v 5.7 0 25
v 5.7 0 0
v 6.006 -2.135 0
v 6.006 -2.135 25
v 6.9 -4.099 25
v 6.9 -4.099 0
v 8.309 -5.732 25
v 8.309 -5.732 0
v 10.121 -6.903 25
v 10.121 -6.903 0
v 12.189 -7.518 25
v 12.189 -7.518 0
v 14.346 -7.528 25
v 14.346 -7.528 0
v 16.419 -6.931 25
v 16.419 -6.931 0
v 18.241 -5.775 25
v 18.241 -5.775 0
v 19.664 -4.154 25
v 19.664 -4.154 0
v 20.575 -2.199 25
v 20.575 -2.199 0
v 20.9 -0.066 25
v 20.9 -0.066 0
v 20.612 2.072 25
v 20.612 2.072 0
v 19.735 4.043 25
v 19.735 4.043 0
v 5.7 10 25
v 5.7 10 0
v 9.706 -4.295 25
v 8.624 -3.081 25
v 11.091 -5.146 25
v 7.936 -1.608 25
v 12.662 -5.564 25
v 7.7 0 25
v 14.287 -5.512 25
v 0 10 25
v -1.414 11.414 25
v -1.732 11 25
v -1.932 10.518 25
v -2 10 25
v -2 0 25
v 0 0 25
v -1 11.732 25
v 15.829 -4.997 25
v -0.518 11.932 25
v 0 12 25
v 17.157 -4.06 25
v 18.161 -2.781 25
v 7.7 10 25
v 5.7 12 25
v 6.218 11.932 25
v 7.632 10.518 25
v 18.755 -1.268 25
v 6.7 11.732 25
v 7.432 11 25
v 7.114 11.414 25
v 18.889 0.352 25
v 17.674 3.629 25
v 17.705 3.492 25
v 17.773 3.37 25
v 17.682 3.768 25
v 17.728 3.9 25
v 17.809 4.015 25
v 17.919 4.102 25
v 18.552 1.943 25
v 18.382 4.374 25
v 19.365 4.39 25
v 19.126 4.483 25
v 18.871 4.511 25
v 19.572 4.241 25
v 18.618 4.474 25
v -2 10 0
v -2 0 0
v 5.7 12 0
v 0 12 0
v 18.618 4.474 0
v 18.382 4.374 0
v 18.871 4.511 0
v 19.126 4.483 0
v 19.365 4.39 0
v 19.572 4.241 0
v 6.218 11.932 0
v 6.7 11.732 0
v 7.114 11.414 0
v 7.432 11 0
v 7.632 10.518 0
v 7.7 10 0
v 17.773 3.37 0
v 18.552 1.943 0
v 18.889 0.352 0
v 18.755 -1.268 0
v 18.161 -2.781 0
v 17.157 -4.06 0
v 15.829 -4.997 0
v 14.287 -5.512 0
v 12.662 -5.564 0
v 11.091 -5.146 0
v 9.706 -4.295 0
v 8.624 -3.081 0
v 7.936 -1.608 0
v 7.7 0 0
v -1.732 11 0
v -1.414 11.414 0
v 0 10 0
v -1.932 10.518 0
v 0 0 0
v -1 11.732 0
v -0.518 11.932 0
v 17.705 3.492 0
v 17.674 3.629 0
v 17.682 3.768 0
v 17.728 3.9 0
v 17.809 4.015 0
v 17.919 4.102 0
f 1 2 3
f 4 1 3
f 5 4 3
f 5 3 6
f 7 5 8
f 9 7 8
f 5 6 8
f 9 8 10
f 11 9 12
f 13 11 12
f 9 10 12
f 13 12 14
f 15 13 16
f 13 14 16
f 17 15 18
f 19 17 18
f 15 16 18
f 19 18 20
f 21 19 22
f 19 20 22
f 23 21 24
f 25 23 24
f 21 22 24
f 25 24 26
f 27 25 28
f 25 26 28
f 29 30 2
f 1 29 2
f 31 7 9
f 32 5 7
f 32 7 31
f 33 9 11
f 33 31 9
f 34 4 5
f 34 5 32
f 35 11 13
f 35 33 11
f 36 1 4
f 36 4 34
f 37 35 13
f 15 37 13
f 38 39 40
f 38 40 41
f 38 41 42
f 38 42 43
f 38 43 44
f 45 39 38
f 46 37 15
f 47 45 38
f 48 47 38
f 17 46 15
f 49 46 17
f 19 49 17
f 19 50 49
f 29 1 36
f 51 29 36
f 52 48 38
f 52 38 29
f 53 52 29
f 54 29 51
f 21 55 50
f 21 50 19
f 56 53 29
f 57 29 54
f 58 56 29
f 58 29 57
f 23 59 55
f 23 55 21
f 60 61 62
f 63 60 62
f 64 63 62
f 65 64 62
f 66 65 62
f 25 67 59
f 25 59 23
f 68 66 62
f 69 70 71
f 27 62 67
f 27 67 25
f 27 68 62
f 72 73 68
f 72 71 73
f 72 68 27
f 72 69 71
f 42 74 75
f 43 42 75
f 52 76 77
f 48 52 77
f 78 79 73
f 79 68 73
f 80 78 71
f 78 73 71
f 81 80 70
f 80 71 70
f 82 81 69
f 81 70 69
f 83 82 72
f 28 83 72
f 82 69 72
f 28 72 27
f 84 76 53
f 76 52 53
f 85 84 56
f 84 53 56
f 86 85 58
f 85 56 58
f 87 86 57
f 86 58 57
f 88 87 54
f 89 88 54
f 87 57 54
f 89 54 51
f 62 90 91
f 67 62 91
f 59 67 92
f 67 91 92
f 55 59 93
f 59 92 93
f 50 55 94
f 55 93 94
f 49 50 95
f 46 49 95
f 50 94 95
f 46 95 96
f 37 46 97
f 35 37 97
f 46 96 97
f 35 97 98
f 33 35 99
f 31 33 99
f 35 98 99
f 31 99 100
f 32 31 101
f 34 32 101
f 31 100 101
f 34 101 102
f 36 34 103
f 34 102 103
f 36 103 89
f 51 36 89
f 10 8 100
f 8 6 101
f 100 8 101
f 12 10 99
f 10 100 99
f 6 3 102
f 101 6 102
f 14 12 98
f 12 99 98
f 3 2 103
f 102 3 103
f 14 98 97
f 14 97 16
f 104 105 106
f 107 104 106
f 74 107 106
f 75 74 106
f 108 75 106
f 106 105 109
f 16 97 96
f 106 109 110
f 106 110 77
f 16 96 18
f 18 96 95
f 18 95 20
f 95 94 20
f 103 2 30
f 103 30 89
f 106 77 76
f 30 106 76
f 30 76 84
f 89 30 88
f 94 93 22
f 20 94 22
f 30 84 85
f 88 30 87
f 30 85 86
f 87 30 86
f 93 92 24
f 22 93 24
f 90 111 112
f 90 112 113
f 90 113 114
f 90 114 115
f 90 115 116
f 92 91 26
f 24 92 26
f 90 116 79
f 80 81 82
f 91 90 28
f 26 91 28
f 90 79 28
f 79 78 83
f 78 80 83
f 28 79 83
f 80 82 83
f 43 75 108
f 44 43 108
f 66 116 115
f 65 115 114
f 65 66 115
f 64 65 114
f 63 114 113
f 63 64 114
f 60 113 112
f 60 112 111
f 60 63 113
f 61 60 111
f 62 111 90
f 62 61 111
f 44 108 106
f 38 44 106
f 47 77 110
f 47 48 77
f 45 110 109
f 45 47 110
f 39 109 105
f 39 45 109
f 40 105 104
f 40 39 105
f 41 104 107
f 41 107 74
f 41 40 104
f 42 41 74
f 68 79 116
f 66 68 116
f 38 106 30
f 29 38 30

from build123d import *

# Parameters (mm, degrees)
F1_DEPTH = 25
F2_R     = 2
F3_R     = 2
F4_R     = 1
F5_R     = 0.5


with BuildPart() as f1:
    # F0 (on Top) → F1 (new body)
    with BuildSketch(Plane.XY):
        with BuildLine():
            Line((7.7, 12), (-2, 12))
            Line((-2, 12), (-2, 0))
            Line((-2, 0), (0, 0))
            Line((0, 0), (0, 10))
            Line((0, 10), (5.7, 10))
            Line((5.7, 10), (5.7, 0))
            ThreePointArc((5.7, 0), (15.867507, -7.153175), (19.165239, 4.833112))
            Line((19.165239, 4.833112), (17.410544, 3.803082))
            ThreePointArc((17.410544, 3.803082), (15.342175, -5.214357), (7.7, 0))
            Line((7.7, 0), (7.7, 12))
        make_face()
    extrude(amount=F1_DEPTH)

    # F2
    f2_edges = [f1.edges().sort_by_distance(p)[0] for p in [
        (7.7, 12, 12.5),
    ]]
    fillet(f2_edges, radius=F2_R)

    # F3
    f3_edges = [f1.edges().sort_by_distance(p)[0] for p in [
        (-2, 12, 12.5),
    ]]
    fillet(f3_edges, radius=F3_R)

    # F4
    f4_edges = [f1.edges().sort_by_distance(p)[0] for p in [
        (19.165239, 4.833112, 12.5),
    ]]
    fillet(f4_edges, radius=F4_R)

    # F5
    f5_edges = [f1.edges().sort_by_distance(p)[0] for p in [
        (17.410544, 3.803082, 12.5),
    ]]
    fillet(f5_edges, radius=F5_R)


solid = f1.part
